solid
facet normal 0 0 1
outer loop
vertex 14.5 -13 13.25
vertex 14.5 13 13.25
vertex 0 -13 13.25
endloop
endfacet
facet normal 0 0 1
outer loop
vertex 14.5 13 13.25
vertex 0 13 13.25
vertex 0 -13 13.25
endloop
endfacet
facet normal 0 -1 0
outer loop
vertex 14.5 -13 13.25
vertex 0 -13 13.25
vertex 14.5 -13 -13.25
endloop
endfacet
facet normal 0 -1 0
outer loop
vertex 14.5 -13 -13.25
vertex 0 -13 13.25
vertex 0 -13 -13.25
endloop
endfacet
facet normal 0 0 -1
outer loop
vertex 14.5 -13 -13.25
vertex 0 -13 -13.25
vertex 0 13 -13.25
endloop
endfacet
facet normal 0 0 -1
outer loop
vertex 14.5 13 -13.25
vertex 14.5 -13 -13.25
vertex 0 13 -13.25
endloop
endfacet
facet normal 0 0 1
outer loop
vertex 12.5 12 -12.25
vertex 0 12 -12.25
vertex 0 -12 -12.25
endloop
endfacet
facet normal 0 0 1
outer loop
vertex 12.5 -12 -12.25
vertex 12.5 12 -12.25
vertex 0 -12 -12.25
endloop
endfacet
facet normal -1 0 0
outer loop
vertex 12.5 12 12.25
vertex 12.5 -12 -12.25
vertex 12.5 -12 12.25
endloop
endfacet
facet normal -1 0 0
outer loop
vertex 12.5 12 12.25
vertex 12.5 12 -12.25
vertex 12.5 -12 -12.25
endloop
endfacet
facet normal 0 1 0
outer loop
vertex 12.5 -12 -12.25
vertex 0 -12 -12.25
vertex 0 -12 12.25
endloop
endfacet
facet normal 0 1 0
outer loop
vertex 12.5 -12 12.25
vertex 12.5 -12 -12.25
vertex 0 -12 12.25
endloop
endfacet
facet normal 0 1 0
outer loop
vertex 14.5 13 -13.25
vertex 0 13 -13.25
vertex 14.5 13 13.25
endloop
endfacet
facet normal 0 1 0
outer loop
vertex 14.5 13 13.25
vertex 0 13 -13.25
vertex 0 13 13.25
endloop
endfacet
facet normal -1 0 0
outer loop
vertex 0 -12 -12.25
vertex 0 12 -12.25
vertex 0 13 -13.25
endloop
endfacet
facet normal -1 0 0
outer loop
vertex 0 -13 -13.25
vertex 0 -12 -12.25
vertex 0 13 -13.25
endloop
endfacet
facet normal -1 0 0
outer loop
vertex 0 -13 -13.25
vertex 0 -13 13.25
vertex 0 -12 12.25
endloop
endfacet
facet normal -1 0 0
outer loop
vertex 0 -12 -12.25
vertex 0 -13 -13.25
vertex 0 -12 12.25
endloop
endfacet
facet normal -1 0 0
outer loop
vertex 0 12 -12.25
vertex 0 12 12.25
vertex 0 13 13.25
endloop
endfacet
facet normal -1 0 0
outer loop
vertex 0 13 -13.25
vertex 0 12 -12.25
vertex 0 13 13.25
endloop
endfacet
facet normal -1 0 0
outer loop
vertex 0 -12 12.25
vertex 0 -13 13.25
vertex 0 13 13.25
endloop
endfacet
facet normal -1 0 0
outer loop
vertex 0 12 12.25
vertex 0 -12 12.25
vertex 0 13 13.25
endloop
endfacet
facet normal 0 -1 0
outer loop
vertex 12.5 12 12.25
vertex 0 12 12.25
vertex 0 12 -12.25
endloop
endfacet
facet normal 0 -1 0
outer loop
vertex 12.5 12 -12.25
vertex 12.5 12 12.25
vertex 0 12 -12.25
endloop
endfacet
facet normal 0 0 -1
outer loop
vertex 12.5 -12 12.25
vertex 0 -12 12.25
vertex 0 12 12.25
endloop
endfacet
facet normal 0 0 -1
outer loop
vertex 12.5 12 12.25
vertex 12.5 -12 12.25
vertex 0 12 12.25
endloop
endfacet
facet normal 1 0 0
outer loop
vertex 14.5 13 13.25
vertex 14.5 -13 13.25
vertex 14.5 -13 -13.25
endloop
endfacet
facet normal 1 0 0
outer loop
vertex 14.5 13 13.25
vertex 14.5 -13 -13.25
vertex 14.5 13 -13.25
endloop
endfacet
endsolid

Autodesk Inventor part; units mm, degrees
ref_plane "YZ Plane" through (0, 0, 0) normal (1, 0, 0) x (0, 1, 0)
ref_plane "XZ Plane" through (0, 0, 0) normal (0, 1, 0) x (-1, 0, 0)
ref_plane "XY Plane" through (0, 0, 0) normal (0, 0, 1) x (1, 0, 0)
sketch "Sketch1" plane through (0, 0, 0) normal (1, 0, 0) x (0, 1, 0)
  line L0 (-12, 12.25) -> (12, 12.25)
  line L1 (12, 12.25) -> (12, -12.25)
  line L2 (12, -12.25) -> (-12, -12.25)
  line L3 (-12, -12.25) -> (-12, 12.25)
  line L4 (-12, 12.25) -> (12, -12.25) construction
  line L5 (12, 12.25) -> (-12, -12.25) construction
  line L6 (-13, -13.25) -> (13, -13.25)
  line L7 (13, -13.25) -> (13, 13.25)
  line L8 (13, 13.25) -> (-13, 13.25)
  line L9 (-13, 13.25) -> (-13, -13.25)
  line L10 (-13, -13.25) -> (13, 13.25) construction
  line L11 (13, -13.25) -> (-13, 13.25) construction
  point P0 (0, 0)
  dimension "d0" = 24
  dimension "d1" = 24.5
  dimension "d2" = 26
  dimension "d3" = 26.5
extrude "Extrusion1" add sketch "Sketch1" along normal blind 14.5
sketch "Sketch2" plane through (0, 13, 13.25) normal (0, 1, 0) x (1, 0, 0)
  line L0 (0, 26.5) -> (14.5, 26.5) projected
  line L1 (0, 0) -> (14.5, 0) projected
  line L2 (14.5, 26.5) -> (12.5, 26.5)
  line L3 (12.5, 26.5) -> (12.5, 0)
  line L4 (12.5, 0) -> (14.5, 0)
  line L5 (14.5, 0) -> (14.5, 26.5)
  point P0 (0, 13.25)
  dimension "d6" = 2
extrude "Extrusion2" add sketch "Sketch2" against normal blind 26
sketch "Sketch3" plane through (0, 0, 0) normal (-1, 0, 0) x (0, 0, 1)
  point P0 (0, 0)
properties part number "servoHolderBase"
